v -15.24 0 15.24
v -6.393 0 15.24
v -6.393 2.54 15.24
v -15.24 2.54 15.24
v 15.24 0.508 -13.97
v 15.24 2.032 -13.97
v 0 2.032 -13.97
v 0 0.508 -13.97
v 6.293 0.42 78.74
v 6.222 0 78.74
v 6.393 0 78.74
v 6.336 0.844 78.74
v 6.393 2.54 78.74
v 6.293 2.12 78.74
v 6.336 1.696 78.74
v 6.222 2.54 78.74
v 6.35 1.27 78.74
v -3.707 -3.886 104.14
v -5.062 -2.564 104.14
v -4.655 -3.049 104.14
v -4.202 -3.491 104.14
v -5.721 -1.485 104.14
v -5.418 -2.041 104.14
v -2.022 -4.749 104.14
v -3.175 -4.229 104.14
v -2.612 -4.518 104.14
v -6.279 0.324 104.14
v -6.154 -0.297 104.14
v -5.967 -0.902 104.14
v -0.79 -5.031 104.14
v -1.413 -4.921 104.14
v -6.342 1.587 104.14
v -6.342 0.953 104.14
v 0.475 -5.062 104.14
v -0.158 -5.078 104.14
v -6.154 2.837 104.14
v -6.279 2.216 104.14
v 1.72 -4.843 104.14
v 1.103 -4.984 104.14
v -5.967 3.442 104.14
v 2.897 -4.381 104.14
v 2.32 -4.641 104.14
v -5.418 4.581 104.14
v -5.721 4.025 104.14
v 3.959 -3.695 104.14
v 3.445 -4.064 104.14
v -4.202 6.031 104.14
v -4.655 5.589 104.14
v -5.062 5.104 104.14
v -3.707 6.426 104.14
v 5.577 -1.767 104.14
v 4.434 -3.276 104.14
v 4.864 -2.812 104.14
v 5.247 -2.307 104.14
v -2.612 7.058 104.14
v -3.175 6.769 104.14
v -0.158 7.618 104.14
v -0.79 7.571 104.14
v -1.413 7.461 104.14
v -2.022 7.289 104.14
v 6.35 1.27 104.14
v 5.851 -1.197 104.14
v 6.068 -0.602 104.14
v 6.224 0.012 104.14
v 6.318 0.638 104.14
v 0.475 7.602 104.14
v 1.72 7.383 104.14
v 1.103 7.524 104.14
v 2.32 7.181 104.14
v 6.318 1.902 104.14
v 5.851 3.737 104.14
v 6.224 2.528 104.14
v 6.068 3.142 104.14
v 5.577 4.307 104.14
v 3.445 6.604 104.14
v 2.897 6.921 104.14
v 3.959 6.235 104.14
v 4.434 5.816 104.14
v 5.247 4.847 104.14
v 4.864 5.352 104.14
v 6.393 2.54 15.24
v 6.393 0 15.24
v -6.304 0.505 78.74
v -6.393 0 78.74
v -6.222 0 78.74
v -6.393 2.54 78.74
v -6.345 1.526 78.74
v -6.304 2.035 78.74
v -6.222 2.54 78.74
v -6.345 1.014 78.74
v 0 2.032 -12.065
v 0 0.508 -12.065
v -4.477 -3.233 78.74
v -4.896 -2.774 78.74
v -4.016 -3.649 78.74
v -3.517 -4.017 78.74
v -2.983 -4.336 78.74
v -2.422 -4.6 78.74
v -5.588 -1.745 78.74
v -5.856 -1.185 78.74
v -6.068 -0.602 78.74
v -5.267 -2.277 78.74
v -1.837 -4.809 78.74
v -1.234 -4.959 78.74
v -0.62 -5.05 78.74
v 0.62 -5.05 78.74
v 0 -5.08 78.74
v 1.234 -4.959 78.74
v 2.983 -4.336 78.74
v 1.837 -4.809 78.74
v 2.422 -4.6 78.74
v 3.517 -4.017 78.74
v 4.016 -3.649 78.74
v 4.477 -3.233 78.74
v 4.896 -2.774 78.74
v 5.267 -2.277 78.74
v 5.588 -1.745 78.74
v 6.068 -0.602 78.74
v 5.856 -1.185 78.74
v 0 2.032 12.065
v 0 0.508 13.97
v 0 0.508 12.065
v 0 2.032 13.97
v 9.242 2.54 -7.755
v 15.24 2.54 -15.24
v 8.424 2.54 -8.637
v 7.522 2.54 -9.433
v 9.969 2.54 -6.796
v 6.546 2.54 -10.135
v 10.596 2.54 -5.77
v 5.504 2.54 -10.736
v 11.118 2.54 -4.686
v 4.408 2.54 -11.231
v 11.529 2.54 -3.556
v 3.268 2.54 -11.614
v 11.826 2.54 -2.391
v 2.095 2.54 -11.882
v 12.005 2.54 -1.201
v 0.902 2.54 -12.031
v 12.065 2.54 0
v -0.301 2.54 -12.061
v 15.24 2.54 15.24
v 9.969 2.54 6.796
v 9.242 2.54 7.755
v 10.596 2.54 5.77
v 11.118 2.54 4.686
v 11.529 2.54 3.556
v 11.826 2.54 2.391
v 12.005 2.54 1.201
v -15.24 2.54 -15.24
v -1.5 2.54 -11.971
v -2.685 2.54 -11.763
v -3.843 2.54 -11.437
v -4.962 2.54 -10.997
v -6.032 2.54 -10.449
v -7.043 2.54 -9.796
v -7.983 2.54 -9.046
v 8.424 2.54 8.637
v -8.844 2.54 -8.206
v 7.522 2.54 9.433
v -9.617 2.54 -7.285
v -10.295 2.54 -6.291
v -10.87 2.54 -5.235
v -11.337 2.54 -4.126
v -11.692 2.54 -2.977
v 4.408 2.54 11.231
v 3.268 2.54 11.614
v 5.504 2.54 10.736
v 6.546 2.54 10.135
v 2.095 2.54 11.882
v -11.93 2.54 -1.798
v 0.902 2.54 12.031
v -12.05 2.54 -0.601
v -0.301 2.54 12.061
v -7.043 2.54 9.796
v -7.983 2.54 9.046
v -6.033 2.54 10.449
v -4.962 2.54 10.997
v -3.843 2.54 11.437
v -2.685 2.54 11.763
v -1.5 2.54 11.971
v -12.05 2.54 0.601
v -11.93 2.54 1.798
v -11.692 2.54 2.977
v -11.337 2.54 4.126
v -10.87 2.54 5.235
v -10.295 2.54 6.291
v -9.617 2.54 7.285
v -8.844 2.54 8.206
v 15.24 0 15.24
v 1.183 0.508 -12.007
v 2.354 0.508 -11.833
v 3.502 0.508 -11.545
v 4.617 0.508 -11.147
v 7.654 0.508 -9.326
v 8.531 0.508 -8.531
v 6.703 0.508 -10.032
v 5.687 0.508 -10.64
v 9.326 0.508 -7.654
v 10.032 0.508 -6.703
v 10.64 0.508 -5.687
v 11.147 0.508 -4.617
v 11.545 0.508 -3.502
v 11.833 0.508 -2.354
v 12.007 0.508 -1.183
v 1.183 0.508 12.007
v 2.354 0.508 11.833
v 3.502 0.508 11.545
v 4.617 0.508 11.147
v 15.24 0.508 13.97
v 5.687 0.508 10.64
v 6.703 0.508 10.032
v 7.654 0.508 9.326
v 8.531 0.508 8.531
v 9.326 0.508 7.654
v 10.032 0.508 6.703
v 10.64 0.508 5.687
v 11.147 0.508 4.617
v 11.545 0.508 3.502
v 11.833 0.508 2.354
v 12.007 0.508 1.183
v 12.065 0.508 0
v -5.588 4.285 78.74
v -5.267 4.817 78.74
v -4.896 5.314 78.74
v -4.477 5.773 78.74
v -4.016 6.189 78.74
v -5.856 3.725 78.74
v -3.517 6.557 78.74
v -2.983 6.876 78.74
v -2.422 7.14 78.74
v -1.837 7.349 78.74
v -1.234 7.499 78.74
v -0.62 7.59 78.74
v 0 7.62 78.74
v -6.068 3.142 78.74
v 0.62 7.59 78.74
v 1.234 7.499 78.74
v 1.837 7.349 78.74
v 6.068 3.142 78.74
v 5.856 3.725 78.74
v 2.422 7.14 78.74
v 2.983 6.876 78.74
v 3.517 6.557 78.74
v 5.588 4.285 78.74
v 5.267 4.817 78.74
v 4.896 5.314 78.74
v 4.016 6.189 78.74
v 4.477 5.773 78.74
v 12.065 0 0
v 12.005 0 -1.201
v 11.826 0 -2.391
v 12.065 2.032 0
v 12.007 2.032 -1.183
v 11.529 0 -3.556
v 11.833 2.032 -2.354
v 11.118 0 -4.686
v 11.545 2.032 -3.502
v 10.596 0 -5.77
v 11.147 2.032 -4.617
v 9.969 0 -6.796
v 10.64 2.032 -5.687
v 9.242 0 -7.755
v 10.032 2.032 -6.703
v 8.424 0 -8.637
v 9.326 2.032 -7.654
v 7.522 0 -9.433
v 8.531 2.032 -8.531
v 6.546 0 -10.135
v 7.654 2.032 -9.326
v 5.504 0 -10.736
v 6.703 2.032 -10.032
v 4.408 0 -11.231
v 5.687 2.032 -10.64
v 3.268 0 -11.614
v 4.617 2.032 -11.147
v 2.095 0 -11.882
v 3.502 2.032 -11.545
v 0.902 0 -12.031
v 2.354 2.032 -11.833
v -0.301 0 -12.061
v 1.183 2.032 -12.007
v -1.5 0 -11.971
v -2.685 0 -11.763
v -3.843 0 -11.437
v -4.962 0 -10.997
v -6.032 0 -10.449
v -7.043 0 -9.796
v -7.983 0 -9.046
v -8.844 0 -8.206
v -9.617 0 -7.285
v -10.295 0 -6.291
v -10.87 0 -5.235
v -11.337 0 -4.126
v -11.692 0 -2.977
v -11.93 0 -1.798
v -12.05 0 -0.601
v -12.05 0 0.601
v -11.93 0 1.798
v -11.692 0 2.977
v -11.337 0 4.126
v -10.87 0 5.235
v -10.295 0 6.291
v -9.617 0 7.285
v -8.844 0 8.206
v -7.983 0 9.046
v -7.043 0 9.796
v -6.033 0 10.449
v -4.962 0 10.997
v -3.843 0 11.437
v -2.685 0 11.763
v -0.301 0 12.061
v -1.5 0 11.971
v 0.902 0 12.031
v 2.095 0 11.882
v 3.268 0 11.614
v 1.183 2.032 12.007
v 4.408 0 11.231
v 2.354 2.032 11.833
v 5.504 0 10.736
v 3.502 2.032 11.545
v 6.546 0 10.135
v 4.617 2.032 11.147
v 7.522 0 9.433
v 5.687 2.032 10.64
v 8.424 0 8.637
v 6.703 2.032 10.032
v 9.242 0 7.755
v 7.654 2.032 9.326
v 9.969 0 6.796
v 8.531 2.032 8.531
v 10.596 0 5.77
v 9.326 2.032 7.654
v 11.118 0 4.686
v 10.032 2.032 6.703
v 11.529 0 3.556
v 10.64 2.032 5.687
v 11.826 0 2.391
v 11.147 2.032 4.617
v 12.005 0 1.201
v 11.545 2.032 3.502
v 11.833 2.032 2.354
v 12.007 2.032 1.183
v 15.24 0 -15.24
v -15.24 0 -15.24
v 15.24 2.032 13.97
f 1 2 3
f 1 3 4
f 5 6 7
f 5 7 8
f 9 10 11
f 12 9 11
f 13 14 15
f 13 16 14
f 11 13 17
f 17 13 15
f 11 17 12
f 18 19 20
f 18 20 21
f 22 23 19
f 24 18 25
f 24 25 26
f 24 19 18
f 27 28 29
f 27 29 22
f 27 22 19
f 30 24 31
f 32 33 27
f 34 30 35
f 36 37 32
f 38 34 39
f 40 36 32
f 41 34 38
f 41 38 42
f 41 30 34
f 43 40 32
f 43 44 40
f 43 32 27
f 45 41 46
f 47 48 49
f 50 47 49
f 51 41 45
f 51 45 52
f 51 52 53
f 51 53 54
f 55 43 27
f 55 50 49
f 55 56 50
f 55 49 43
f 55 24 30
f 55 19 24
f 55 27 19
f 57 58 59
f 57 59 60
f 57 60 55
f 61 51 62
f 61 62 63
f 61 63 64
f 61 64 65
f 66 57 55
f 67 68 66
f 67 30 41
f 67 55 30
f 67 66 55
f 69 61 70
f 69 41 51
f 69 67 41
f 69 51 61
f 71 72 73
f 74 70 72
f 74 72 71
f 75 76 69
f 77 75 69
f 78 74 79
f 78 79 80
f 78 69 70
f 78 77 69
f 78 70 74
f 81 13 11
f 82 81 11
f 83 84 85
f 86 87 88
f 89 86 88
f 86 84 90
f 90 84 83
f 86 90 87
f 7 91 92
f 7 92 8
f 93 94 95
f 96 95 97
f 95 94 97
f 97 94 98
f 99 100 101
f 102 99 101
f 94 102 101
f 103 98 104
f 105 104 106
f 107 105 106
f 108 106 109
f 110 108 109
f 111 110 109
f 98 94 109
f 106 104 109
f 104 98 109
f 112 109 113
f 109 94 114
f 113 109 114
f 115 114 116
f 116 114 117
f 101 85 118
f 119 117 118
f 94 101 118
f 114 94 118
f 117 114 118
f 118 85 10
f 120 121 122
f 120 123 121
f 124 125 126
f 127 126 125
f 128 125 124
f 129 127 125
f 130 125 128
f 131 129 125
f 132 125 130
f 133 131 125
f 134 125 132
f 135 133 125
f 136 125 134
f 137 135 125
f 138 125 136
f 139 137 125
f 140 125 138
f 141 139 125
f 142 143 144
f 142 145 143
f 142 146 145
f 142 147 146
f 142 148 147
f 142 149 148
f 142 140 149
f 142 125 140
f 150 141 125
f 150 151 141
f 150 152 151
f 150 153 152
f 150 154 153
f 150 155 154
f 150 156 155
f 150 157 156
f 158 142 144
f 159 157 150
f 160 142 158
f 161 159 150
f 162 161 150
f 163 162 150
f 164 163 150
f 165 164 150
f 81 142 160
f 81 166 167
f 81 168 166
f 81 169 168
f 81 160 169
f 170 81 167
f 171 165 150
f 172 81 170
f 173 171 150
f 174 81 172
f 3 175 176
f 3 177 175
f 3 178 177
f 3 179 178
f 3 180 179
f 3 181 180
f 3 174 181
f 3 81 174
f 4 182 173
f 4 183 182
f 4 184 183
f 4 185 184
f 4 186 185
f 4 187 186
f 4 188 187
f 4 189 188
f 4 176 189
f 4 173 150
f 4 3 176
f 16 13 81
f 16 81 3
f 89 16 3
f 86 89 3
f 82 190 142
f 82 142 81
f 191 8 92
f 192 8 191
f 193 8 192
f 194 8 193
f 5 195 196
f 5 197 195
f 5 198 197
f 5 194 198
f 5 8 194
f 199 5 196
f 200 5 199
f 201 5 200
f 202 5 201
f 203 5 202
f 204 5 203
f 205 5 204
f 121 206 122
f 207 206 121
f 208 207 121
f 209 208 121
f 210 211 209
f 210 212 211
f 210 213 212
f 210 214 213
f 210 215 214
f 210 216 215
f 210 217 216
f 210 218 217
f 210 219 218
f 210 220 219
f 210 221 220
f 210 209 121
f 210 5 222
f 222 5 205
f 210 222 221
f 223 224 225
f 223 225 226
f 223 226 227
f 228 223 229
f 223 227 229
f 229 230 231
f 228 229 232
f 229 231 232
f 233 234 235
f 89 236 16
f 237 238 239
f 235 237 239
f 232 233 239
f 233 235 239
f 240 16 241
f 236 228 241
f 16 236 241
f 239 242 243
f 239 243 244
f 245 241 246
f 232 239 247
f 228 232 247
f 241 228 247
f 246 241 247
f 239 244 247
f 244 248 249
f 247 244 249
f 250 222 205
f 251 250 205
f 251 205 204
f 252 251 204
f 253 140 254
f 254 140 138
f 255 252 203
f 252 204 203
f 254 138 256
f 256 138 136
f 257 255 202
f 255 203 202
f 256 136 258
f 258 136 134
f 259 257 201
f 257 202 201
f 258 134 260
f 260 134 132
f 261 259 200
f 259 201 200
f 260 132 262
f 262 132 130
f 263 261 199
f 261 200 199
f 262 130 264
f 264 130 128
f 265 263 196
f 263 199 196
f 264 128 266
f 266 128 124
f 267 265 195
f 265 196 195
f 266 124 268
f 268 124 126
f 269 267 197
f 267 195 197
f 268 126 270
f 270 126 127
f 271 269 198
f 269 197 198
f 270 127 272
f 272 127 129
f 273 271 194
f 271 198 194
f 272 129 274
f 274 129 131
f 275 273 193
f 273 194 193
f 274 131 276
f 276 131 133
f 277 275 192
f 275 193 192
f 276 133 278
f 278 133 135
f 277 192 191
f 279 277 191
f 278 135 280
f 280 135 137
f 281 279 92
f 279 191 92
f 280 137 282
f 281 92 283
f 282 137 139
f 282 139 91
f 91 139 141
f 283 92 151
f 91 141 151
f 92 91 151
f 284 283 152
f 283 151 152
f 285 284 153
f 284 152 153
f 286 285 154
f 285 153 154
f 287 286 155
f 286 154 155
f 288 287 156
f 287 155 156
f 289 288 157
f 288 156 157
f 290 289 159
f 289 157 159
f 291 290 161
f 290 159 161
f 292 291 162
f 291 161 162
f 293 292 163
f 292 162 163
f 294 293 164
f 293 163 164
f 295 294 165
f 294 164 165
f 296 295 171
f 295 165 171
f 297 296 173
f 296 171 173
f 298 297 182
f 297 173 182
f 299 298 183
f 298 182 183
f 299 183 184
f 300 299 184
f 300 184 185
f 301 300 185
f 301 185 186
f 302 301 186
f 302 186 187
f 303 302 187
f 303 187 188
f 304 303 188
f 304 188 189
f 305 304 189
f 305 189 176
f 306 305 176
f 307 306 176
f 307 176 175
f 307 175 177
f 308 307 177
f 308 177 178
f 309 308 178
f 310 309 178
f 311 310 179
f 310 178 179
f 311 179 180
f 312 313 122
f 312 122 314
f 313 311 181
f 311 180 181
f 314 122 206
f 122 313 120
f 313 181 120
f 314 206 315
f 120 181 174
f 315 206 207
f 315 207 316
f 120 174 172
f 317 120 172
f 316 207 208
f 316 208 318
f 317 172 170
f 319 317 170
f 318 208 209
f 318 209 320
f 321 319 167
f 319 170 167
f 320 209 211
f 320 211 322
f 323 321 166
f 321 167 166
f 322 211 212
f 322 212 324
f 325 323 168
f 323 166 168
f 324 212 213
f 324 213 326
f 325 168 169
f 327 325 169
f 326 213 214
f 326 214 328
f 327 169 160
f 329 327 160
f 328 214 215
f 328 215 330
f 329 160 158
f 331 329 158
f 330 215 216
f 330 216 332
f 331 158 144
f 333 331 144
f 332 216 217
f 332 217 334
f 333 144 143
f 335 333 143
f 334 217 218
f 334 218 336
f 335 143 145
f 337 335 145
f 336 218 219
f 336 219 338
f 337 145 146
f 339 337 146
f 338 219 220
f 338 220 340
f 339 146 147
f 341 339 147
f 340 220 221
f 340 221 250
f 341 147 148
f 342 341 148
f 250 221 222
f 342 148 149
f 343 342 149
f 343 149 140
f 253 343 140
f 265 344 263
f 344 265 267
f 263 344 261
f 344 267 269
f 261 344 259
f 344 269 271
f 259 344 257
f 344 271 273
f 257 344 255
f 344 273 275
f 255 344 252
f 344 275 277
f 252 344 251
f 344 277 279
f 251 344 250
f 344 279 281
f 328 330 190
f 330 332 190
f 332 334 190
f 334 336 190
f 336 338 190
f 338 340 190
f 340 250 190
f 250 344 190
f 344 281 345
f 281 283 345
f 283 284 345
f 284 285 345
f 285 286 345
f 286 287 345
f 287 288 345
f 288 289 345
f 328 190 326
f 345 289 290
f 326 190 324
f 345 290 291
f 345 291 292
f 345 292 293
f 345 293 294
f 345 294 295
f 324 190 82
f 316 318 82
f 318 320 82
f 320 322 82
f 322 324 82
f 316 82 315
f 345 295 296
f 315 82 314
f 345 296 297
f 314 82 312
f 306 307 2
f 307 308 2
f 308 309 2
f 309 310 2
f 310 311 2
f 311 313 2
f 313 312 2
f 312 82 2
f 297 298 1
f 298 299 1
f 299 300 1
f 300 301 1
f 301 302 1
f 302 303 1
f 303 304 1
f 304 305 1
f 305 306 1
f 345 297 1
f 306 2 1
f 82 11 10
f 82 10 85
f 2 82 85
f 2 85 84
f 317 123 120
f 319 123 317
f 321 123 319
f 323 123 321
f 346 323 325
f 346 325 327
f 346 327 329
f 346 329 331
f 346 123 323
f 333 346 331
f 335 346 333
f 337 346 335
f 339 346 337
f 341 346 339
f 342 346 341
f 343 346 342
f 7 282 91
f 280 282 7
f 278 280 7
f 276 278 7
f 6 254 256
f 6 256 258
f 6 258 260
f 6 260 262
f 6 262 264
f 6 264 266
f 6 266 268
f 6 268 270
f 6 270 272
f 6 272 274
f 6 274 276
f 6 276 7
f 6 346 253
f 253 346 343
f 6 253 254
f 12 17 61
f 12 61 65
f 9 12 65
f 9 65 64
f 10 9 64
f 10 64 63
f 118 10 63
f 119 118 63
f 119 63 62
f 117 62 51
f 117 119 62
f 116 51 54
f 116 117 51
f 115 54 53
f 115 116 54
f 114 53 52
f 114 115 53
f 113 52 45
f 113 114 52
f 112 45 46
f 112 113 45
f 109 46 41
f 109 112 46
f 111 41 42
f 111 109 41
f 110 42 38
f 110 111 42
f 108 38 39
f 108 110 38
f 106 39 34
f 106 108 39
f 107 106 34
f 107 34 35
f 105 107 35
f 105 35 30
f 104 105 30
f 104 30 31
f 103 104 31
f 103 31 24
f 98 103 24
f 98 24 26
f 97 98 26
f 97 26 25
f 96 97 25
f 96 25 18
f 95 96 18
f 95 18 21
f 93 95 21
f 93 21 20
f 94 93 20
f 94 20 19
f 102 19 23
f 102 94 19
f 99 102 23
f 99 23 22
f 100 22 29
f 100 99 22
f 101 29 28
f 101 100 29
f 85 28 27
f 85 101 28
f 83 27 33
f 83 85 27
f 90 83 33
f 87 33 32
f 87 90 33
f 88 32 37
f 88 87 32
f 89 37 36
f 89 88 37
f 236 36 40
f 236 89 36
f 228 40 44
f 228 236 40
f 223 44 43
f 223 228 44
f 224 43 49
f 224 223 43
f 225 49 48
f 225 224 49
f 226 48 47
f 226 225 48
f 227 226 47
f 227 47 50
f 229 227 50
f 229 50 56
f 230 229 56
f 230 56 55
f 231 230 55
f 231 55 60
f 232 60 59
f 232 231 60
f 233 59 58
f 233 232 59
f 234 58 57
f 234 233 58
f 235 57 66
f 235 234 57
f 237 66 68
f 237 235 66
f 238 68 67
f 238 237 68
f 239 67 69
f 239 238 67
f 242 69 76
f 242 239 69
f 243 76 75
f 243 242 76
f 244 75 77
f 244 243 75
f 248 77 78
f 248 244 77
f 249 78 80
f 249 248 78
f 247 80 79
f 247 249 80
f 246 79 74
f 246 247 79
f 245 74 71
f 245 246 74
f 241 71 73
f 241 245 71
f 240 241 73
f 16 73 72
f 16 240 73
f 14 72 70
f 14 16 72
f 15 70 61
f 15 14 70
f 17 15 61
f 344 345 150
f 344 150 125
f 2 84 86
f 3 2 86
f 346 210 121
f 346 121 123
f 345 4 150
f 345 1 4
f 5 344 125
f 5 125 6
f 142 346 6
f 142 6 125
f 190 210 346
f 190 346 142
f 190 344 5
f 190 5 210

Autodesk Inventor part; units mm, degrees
ref_plane "YZ Plane" through (0, 0, 0) normal (1, 0, 0) x (0, 1, 0)
ref_plane "XZ Plane" through (0, 0, 0) normal (0, 1, 0) x (-1, 0, 0)
ref_plane "XY Plane" through (0, 0, 0) normal (0, 0, 1) x (1, 0, 0)
sketch "Sketch1" plane through (0, 0, 0) normal (0, 1, 0) x (-1, 0, 0)
  line L0 (15.24, -15.24) -> (-15.24, -15.24)
  line L1 (-15.24, -15.24) -> (-15.24, 15.24)
  line L2 (-15.24, 15.24) -> (15.24, 15.24)
  line L3 (15.24, 15.24) -> (15.24, -15.24)
  line L4 (15.24, -15.24) -> (-15.24, 15.24) construction
  line L5 (-15.24, -15.24) -> (15.24, 15.24) construction
  circle A0 centre (0, 0) radius 15.24
  dimension "d0" = 30.48
  dimension "d3" = 30.48
extrude "Extrusion1" add sketch "Sketch1" along normal blind 2.54
sketch "Sketch2" plane through (-15.24, 0, 15.24) normal (0, 0, 1) x (1, 0, 0)
  line L0 (30.48, 0) -> (0, 0) projected
  line L1 (8.8466, 2.54) -> (21.6334, 2.54)
  line L2 (21.6334, 2.54) -> (21.6334, 0)
  line L3 (21.6334, 0) -> (8.8466, 0)
  line L4 (8.8466, 0) -> (8.8466, 2.54)
  line L5 (8.8466, 2.54) -> (21.6334, 0) construction
  line L6 (21.6334, 2.54) -> (8.8466, 0) construction
  point P0 (15.24, 0)
  point P1 (15.24, 1.27)
extrude "Extrusion2" add sketch "Sketch2" along normal blind 63.5
sketch "Sketch5" plane through (-15.24, 0, 78.74) normal (0, 0, 1) x (1, 0, 0)
  circle A0 centre (15.24, 1.27) radius 6.35
  point P0 (15.24, 0)
  dimension "d14" = 12.7
extrude "Extrusion5" add sketch "Sketch5" along normal blind 25.4
sketch "Sketch7" plane through (15.24, 0, 15.24) normal (1, 0, 0) x (0, 0, -1)
  line L0 (1.27, 2.032) -> (29.21, 2.032)
  line L1 (29.21, 2.032) -> (29.21, 0.508)
  line L2 (29.21, 0.508) -> (1.27, 0.508)
  line L3 (1.27, 0.508) -> (1.27, 2.032)
  line L4 (1.27, 2.032) -> (29.21, 0.508) construction
  line L5 (29.21, 2.032) -> (1.27, 0.508) construction
  point P0 (15.24, 0)
  point P1 (15.24, 1.27)
  dimension "d35" = 27.94
  dimension "d36" = 1.524
extrude "Extrusion7" cut sketch "Sketch7" against normal blind 15.24
sketch "Sketch8" plane through (0, 2.54, 0) normal (0, 1, 0) x (1, 0, 0)
  circle A0 centre (0, 0) radius 12.065
  dimension "d39" = 24.13
extrude "Extrusion8" cut sketch "Sketch8" against normal blind 31.75
sketch "Sketch9" plane through (0, 2.54, 0) normal (0, 1, 0) x (1, 0, 0)
  circle A0 centre (0, 0) radius 12.065 projected
  line L0 (15.24, 15.24) -> (-15.24, 15.24) projected
  line L1 (-15.24, 15.24) -> (-15.24, -15.24) projected
  line L2 (-15.24, -15.24) -> (-6.3934, -15.24) projected
  line L3 (-6.3934, -15.24) -> (-6.3934, -78.74) projected
  line L4 (-6.2217, -78.74) -> (-6.3934, -78.74) projected
  line L5 (6.2217, -78.74) -> (-6.2217, -78.74) projected
  line L6 (6.3934, -78.74) -> (6.2217, -78.74) projected
  line L7 (6.3934, -15.24) -> (6.3934, -78.74) projected
  line L8 (6.3934, -15.24) -> (15.24, -15.24) projected
  line L9 (15.24, -15.24) -> (15.24, 15.24) projected
  circle A1 centre (0, 0) radius 13.97
  circle A2 centre (0, 0) radius 12.065 projected
  line L10 (-6.2217, -78.74) -> (6.2217, -78.74) projected
  line L11 (6.2217, -78.74) -> (6.2217, -104.14) projected
  line L12 (6.2217, -104.14) -> (-6.2217, -104.14) projected
  line L13 (-6.2217, -104.14) -> (-6.2217, -78.74) projected
  line L14 (-6.2217, -78.74) -> (-6.3934, -78.74) projected
  line L15 (-6.3934, -78.74) -> (-6.3934, -15.24) projected
  line L16 (-6.3934, -15.24) -> (-15.24, -15.24) projected
  line L17 (-15.24, -15.24) -> (-15.24, 15.24) projected
  line L18 (-15.24, 15.24) -> (15.24, 15.24) projected
  line L19 (15.24, 15.24) -> (15.24, -15.24) projected
  line L20 (15.24, -15.24) -> (6.3934, -15.24) projected
  line L21 (6.3934, -15.24) -> (6.3934, -78.74) projected
  line L22 (6.3934, -78.74) -> (6.2217, -78.74) projected
  dimension "d42" = 27.94
properties part number "Silicon Frame v2"
